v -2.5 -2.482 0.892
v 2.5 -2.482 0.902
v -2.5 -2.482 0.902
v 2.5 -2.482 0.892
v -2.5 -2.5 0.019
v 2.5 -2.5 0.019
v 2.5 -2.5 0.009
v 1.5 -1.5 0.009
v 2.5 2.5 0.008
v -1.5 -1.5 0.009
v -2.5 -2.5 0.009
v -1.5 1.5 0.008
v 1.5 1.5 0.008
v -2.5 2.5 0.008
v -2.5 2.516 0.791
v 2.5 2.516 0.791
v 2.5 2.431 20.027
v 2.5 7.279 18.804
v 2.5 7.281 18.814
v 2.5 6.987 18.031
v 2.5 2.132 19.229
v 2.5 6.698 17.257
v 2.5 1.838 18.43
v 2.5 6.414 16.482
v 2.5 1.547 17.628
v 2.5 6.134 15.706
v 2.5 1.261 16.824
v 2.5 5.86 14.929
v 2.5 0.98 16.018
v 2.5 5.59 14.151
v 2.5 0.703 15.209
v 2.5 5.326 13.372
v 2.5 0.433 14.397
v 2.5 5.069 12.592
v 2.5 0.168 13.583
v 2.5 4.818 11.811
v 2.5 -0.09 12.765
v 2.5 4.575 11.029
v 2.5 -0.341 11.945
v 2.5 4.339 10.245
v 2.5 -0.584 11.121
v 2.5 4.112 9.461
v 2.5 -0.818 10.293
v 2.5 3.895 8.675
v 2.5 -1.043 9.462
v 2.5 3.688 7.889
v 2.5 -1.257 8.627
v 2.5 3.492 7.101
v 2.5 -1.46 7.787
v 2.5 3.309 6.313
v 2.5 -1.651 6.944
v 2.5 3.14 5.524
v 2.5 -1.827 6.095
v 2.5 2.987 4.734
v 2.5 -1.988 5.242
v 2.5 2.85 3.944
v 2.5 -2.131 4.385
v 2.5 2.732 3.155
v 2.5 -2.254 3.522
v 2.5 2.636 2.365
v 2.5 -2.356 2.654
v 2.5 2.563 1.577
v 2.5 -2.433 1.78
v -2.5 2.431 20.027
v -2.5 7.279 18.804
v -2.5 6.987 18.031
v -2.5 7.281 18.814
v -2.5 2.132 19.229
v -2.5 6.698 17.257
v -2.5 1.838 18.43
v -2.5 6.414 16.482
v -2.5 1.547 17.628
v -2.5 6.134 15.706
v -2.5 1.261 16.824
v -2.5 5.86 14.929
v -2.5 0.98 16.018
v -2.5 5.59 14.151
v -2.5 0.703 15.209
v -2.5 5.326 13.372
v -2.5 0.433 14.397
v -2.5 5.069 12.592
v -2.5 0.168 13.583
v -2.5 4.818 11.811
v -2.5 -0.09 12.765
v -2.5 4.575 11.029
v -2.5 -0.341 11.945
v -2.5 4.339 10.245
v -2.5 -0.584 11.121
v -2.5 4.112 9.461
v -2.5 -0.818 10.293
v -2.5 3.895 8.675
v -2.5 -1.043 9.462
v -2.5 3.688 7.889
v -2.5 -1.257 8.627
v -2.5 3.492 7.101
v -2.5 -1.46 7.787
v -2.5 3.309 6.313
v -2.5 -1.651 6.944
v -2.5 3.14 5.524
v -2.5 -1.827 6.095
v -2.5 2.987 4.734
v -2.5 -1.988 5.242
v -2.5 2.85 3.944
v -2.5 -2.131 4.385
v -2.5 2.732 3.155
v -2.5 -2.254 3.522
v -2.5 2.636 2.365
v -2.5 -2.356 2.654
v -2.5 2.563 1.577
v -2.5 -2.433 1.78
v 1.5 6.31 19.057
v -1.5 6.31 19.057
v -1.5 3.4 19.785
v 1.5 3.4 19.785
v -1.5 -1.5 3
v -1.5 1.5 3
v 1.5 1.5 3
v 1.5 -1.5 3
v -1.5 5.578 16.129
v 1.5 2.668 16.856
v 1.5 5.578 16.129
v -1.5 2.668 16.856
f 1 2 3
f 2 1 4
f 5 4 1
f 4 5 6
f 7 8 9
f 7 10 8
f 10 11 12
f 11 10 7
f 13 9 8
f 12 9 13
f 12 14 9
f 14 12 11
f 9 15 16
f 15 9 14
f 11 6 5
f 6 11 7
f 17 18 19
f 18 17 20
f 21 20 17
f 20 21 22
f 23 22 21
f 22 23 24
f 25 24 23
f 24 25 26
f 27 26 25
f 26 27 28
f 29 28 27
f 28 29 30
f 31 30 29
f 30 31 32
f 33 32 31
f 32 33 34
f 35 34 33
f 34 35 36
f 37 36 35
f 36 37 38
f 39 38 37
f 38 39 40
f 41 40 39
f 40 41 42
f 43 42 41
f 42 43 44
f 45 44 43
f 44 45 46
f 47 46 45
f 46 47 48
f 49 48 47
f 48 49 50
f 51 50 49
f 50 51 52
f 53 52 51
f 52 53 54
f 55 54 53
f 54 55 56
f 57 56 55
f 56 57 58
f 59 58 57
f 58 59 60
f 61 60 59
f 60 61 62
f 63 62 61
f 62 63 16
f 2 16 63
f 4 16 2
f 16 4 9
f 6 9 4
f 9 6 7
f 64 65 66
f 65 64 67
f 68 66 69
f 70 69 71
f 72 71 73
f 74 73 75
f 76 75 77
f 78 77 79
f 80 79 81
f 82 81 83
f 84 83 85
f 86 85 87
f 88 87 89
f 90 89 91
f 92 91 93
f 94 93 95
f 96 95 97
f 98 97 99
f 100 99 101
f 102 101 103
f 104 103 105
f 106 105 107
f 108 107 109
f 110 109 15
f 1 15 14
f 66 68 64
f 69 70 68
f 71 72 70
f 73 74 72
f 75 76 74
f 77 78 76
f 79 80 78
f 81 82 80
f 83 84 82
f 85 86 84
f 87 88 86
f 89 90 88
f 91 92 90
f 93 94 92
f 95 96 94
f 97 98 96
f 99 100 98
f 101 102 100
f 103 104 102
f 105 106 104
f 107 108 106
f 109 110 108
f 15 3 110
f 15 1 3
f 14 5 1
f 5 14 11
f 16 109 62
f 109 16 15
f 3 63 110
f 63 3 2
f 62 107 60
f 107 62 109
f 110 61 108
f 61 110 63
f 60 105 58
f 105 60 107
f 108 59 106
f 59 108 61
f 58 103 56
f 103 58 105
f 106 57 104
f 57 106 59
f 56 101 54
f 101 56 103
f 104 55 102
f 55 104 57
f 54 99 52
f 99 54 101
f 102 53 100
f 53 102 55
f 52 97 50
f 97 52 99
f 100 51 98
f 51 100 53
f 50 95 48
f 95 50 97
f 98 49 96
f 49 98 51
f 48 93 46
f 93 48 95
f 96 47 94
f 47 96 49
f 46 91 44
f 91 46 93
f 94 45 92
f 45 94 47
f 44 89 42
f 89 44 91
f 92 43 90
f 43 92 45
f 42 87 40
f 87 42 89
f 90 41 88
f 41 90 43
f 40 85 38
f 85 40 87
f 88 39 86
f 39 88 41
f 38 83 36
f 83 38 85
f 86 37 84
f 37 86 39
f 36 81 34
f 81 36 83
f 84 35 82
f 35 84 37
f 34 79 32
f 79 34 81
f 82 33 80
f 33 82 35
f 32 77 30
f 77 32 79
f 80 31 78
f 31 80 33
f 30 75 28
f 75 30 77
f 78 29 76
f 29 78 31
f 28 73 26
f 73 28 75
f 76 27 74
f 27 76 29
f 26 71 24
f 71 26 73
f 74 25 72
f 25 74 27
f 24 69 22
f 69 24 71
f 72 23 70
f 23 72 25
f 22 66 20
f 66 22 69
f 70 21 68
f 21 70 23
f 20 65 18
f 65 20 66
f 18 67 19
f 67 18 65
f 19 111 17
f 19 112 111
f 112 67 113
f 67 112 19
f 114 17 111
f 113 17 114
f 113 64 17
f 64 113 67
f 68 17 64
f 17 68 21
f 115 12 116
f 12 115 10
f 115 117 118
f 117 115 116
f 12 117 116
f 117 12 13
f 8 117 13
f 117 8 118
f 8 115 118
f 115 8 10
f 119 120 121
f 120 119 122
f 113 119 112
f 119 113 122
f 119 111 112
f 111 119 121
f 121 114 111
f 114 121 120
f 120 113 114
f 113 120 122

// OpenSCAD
$fn=24;

module rotate_towards(pointing){
	rotate([0,0,atan2(pointing[1], pointing[0])])
	rotate([0,atan2(norm([pointing[1], pointing[0]]), pointing[2]),0])
	// This initial 'untwisting' is necassary to preserve initial rotation but
	// it seems like it's causing small misalignment issues. Nothing massive,
	// should be within the tolerances established.
	rotate([0,0,-atan2(pointing[1], pointing[0])])
	children();
}

// Demo of rotate towards
*for(x=[0:10]){
	pointing = [0,x,15];

	translate(pointing) sphere(d=0.5);

	translate([0,0,x])%rotate_towards(pointing-[0,0,x])
	cylinder(d=1,h=15);
}

module sweep_extrude(start_target,end_target,steps,height){
	for(i=[0:steps-1]){
		i_bump = i + 0.01;
		progress_pre = i_bump/steps;
		progress_post = (i_bump+1)/steps;

		target_pre = start_target + ((end_target - start_target) * progress_pre);
		target_post = start_target + ((end_target - start_target) * progress_post);
		
		// Debug shapes:
		*union(){
			color([0.5,0.5,0.5,0.5]) %rotate_towards(target_pre) translate([0,0,height * progress_pre]) cylinder(h=500,d=0.5);
			color([0.5,0.5,0.5,0.5]) %rotate_towards(target_post) translate([0,0,height * progress_post]) cylinder(h=500,d=0.5);

			translate(target_pre) sphere(d=0.5);
			translate(target_post) sphere(d=0.5);
		}

		hull(){
			rotate_towards(target_pre) translate([0,0,height * progress_pre])  linear_extrude(0.01) children();
			rotate_towards(target_post) translate([0,0,height * progress_post]) linear_extrude(0.01) children();
		}
	}
}

// Demo showing its intended use - creating an adapter in 3d space between angles
difference(){
	sweep_extrude([0,0,20],[0,10,40],$fn,20)difference(){square(5,center=true);};
	linear_extrude(3)square(3,center=true);
	rotate_towards([0,10,40])translate([0,0,17])linear_extrude(3.1)square(3,center=true);
}
